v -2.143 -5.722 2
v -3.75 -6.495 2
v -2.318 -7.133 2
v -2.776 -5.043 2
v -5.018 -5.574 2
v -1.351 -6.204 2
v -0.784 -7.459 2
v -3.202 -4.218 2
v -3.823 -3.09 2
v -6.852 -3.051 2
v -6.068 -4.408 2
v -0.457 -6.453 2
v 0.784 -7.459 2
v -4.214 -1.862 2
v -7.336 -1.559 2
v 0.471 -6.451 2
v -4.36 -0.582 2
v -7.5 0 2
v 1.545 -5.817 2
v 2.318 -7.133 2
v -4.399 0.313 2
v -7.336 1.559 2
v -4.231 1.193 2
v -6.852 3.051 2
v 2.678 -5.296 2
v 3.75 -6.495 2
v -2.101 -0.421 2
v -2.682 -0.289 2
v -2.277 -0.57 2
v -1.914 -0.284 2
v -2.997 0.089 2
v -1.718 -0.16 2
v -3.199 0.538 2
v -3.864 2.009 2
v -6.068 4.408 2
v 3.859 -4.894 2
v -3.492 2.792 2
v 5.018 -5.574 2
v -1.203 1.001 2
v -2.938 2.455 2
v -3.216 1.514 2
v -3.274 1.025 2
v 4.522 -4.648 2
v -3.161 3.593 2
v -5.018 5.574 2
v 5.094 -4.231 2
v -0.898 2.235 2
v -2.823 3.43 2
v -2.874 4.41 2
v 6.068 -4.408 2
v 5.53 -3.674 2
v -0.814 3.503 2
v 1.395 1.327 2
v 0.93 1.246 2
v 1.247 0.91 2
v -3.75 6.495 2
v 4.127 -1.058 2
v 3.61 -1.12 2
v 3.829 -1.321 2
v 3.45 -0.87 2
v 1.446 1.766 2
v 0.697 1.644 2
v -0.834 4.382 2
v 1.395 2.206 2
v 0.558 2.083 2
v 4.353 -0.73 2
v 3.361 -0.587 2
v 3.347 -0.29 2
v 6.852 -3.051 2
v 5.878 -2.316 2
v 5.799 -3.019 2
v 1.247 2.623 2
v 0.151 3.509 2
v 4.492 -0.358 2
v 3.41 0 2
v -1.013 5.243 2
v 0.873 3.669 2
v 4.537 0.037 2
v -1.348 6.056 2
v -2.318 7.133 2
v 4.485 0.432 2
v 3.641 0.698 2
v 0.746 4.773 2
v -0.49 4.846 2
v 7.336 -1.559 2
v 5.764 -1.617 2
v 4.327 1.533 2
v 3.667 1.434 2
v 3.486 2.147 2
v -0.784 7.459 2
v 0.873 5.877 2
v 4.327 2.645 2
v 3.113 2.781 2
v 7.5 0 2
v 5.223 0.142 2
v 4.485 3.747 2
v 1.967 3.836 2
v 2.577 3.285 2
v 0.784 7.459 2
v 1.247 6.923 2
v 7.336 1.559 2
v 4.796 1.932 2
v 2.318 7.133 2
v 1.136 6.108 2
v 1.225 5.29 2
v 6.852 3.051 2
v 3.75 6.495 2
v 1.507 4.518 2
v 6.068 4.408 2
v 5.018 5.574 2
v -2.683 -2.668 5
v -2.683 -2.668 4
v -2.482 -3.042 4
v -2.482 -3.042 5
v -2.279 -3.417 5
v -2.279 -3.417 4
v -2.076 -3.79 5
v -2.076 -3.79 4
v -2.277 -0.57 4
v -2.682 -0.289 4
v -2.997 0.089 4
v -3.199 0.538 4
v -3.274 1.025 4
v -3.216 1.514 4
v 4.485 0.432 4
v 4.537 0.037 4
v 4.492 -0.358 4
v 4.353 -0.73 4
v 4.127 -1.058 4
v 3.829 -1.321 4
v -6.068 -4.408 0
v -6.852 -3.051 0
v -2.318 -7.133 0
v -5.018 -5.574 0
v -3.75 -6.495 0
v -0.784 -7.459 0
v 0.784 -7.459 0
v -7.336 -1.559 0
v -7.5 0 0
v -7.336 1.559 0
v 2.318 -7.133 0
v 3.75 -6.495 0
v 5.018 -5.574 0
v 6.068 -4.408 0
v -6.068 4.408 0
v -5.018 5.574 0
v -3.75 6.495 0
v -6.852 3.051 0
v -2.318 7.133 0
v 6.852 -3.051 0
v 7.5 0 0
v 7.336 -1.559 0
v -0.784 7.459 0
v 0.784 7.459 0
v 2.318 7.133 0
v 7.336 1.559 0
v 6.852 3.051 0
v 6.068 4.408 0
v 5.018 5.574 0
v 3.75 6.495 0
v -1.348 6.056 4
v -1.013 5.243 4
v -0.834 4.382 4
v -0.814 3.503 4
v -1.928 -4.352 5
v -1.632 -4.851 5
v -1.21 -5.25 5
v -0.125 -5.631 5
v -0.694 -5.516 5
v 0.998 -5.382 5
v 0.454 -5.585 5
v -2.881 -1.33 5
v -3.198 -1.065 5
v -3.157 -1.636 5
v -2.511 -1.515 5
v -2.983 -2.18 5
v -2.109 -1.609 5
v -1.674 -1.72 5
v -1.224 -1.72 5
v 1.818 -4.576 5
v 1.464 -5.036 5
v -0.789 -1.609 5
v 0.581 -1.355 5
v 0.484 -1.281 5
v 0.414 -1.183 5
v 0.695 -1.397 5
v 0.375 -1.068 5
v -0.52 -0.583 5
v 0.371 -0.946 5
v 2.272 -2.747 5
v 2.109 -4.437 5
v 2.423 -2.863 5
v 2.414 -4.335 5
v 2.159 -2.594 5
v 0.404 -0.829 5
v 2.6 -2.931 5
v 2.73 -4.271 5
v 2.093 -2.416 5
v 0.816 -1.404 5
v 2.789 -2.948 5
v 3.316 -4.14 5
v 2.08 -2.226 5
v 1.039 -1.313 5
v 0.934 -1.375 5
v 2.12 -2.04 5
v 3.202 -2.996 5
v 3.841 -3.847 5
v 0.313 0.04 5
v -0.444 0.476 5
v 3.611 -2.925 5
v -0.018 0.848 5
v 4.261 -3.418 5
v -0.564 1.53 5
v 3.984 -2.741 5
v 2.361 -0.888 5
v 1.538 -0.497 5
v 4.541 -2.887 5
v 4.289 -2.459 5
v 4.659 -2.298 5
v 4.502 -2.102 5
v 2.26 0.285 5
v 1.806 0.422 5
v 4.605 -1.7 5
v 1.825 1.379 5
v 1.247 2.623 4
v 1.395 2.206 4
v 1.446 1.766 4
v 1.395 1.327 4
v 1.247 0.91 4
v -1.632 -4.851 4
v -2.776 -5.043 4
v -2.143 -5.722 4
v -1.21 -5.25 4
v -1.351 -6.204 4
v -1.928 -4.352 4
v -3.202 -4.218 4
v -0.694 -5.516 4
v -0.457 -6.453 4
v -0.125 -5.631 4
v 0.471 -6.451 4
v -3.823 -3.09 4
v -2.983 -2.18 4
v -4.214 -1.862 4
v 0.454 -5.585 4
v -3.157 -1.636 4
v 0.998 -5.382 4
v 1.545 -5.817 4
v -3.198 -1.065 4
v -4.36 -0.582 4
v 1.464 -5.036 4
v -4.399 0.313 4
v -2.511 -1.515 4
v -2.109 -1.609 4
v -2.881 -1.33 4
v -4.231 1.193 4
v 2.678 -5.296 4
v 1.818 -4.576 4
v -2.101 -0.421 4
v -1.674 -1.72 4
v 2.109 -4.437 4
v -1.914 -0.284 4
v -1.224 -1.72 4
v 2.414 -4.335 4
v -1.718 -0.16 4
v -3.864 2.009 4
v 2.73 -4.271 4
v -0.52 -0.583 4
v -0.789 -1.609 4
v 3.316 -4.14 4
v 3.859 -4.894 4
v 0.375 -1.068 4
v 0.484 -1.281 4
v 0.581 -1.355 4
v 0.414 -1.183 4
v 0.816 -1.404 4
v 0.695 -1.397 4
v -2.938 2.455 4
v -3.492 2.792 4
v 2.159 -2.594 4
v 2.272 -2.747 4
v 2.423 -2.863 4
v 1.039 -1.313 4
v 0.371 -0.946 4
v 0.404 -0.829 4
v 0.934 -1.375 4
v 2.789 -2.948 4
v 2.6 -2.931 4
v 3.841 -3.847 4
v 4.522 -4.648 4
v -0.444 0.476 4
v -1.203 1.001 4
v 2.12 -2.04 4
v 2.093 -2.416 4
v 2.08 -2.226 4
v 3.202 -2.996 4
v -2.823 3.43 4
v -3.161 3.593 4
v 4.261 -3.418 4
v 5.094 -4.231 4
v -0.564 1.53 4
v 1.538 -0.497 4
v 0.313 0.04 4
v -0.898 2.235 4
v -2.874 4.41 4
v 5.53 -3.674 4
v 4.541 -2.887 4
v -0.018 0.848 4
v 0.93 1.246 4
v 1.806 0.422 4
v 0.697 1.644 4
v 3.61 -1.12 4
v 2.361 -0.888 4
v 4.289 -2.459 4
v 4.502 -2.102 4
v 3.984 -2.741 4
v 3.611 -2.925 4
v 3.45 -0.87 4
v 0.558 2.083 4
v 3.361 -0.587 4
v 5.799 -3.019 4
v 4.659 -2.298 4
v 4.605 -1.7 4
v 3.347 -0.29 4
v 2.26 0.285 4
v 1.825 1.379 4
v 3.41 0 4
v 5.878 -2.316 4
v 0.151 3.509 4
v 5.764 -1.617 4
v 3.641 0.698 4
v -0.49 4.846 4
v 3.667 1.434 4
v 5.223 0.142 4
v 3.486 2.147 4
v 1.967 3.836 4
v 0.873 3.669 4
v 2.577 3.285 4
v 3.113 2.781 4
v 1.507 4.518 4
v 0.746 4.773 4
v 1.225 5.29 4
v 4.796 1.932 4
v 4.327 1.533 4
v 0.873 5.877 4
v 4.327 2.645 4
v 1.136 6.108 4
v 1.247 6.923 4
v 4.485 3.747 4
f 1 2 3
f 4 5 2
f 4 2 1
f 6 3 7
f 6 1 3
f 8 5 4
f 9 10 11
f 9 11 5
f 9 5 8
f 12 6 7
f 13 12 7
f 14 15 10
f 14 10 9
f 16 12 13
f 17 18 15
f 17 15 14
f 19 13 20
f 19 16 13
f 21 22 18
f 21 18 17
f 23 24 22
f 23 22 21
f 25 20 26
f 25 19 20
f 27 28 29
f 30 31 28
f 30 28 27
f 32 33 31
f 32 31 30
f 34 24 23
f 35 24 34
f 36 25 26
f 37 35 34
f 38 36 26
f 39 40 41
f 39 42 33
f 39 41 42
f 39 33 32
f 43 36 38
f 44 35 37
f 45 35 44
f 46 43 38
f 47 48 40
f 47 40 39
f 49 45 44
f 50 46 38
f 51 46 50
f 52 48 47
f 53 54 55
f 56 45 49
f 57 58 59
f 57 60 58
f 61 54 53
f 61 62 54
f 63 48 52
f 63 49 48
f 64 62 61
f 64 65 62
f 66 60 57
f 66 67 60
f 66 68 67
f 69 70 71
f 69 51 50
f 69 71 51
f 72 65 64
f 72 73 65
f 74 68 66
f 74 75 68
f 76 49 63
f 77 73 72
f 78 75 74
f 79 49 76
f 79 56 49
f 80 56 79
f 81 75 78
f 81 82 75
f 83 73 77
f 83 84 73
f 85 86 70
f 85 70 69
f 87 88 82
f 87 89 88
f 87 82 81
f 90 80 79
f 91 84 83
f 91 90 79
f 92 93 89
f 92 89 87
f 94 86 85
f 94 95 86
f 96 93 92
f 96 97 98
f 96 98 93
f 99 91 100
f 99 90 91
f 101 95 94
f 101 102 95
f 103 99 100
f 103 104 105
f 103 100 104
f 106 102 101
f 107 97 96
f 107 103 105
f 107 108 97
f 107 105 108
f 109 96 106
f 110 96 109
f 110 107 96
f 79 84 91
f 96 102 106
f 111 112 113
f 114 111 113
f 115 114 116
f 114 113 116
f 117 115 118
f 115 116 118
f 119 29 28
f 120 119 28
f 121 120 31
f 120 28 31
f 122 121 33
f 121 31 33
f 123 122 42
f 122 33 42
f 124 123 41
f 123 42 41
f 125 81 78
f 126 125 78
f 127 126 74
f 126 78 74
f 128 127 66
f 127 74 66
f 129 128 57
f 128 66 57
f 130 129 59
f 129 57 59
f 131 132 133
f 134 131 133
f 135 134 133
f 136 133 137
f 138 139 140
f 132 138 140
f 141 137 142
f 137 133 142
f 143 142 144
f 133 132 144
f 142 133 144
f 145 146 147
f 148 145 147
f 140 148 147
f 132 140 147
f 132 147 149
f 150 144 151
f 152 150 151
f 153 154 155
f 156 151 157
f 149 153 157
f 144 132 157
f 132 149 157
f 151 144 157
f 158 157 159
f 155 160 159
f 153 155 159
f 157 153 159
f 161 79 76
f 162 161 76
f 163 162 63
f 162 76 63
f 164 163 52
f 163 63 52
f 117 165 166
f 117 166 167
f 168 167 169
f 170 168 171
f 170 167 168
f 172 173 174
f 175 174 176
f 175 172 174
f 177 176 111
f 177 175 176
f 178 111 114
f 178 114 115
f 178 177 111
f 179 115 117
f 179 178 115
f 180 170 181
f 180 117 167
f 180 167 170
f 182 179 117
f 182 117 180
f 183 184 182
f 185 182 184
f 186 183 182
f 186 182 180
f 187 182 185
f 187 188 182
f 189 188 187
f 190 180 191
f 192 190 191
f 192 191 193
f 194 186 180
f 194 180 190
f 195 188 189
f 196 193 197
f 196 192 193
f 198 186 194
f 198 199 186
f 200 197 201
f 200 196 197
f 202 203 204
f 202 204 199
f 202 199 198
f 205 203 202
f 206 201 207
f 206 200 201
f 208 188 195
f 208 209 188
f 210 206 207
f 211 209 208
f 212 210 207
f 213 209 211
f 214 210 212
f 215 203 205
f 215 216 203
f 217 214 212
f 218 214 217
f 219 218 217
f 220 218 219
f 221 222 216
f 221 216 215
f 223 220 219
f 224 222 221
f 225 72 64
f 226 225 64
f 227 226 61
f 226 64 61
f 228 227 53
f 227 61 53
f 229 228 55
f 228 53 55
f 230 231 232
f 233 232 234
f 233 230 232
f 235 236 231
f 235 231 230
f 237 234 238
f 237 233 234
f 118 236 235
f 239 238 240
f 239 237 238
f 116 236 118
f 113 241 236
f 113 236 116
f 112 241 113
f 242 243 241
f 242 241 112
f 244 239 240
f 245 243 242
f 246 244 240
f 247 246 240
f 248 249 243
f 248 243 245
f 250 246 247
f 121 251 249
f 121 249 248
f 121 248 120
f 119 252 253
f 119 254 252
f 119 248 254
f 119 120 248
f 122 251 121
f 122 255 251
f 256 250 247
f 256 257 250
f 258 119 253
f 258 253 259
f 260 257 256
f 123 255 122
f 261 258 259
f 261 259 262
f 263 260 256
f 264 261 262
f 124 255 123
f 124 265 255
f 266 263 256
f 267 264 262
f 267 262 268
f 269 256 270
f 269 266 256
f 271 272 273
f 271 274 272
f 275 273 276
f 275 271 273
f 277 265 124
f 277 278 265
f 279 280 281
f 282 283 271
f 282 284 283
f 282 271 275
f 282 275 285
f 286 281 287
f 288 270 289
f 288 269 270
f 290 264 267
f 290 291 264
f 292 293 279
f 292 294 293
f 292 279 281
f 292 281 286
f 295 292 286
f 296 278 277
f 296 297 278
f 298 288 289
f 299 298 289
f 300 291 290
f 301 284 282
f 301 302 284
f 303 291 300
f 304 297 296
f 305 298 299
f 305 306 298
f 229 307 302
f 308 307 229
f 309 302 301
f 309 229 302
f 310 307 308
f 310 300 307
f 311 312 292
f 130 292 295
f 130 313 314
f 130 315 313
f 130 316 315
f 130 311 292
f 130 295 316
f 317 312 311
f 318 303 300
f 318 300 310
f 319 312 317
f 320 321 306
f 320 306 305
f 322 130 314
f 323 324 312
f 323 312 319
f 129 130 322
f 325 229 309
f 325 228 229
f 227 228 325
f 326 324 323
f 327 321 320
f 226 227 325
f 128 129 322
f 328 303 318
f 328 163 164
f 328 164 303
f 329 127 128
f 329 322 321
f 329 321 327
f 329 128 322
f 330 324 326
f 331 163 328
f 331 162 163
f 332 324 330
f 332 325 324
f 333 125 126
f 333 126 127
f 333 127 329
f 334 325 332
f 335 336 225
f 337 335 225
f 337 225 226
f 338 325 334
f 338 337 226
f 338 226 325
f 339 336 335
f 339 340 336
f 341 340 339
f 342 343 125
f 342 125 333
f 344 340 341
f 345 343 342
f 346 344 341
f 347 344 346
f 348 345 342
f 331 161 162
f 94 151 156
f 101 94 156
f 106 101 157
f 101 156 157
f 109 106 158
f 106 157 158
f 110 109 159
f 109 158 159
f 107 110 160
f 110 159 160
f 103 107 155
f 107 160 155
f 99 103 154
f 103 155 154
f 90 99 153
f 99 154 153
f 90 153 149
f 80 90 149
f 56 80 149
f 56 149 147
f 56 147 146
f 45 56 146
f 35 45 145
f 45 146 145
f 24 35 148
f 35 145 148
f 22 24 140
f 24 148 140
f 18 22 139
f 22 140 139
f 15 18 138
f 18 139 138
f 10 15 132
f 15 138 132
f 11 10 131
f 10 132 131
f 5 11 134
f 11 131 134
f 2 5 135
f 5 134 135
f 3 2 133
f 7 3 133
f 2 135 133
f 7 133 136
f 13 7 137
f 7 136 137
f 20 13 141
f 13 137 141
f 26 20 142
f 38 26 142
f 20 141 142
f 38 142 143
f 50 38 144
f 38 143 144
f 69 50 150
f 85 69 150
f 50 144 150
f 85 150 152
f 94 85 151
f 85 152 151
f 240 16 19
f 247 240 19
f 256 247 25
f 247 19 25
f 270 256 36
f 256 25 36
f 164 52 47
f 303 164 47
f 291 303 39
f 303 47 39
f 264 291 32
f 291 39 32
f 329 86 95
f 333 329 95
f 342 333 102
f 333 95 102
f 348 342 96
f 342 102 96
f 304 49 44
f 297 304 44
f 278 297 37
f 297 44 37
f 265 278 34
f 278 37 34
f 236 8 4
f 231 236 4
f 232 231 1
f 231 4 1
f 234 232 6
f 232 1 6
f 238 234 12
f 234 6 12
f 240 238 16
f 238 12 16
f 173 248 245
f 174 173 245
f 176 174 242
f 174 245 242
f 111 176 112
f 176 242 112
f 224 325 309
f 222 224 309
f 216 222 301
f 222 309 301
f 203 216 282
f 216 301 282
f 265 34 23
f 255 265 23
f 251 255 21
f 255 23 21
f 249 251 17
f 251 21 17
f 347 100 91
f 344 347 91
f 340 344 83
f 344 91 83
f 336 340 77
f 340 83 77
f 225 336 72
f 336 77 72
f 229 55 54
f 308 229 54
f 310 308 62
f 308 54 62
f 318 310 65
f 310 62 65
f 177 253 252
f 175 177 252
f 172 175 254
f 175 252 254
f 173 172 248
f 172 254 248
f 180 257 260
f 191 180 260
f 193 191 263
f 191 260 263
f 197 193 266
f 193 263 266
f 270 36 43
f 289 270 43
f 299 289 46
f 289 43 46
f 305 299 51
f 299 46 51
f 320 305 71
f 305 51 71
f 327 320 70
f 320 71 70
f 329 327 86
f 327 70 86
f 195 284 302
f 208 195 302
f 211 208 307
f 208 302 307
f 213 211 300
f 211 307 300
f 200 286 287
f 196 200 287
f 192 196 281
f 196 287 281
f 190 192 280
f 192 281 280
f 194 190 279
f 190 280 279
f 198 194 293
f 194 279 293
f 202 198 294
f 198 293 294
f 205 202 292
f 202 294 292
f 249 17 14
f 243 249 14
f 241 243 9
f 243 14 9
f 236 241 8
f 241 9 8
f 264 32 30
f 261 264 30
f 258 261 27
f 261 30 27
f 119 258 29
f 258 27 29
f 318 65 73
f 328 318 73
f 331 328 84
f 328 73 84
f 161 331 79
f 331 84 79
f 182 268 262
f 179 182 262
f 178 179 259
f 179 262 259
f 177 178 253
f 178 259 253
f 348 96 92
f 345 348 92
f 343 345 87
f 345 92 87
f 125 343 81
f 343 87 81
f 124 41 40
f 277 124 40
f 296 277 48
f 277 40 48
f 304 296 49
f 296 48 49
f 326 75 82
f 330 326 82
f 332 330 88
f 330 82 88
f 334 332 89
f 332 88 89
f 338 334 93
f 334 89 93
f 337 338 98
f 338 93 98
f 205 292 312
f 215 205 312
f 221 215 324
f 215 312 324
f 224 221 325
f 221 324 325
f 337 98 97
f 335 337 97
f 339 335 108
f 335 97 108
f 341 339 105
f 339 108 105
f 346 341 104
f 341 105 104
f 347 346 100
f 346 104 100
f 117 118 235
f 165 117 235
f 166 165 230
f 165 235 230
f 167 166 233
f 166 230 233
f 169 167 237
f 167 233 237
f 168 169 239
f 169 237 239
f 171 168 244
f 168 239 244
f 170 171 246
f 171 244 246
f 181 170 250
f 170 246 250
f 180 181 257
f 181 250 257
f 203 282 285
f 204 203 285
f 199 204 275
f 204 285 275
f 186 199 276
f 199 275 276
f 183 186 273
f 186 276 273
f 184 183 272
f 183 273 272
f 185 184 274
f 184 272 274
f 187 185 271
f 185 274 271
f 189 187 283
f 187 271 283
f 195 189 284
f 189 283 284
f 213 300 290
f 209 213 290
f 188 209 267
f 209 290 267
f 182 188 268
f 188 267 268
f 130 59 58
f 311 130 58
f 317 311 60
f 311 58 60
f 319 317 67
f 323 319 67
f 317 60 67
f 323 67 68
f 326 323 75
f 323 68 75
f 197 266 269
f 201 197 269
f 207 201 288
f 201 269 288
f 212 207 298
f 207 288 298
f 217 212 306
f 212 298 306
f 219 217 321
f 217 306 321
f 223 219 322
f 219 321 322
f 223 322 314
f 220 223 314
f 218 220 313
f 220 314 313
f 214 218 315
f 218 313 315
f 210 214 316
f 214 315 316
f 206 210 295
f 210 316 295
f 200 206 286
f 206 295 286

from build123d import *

# Parameters (mm, degrees)
F0_R     = 7.5
F1_DEPTH = 2
F3_DEPTH = 2
F5_DEPTH = 1


with BuildPart() as f1:
    # F0 (on Top) → F1 (new body)
    with BuildSketch(Plane.XY):
        Circle(F0_R)
    extrude(amount=F1_DEPTH)

    # F2 (on face) → F3 (join)
    with BuildSketch(Plane.XY.offset(2)):
        with BuildLine():
            ThreePointArc((-4.359569, -0.5816), (-4.048866, -2.485422), (-3.201723, -4.21846))
            ThreePointArc((-3.201723, -4.21846), (-1.763517, -5.989849), (0.471135, -6.450916))
            ThreePointArc((0.471135, -6.450916), (2.104993, -5.542203), (3.85862, -4.894092))
            ThreePointArc((3.85862, -4.894092), (5.530357, -3.673758), (5.763789, -1.6172))
            ThreePointArc((5.763789, -1.6172), (4.99478, 1.033842), (4.484988, 3.746685))
            ThreePointArc((4.484988, 3.746685), (4.307559, 2.089188), (4.484988, 0.43169))
            ThreePointArc((4.484988, 0.43169), (4.433756, -0.548224), (3.829129, -1.321065))
            ThreePointArc((3.829129, -1.321065), (3.396288, -0.731371), (3.409992, 0))
            ThreePointArc((3.409992, 0), (3.601771, 1.796582), (2.577243, 3.284811))
            ThreePointArc((2.577243, 3.284811), (1.342352, 4.895456), (1.246507, 6.922756))
            ThreePointArc((1.246507, 6.922756), (0.746139, 4.772952), (1.246507, 2.623147))
            ThreePointArc((1.246507, 2.623147), (1.445906, 1.76644), (1.246507, 0.909734))
            ThreePointArc((1.246507, 0.909734), (0.802459, 1.438025), (0.558072, 2.083429))
            ThreePointArc((0.558072, 2.083429), (-0.141358, 4.191438), (-1.347645, 6.056319))
            ThreePointArc((-1.347645, 6.056319), (-0.903638, 4.8169), (-0.814198, 3.503393))
            ThreePointArc((-0.814198, 3.503393), (-1.023492, 1.611686), (-1.718377, -0.160176))
            ThreePointArc((-1.718377, -0.160176), (-2.008384, -0.350929), (-2.2774, -0.570297))
            ThreePointArc((-2.2774, -0.570297), (-3.112946, 0.306997), (-3.216468, 1.514086))
            ThreePointArc((-3.216468, 1.514086), (-2.859593, 2.940059), (-2.873537, 4.409944))
            ThreePointArc((-2.873537, 4.409944), (-3.321426, 3.190102), (-3.864225, 2.00943))
            ThreePointArc((-3.864225, 2.00943), (-4.340752, 0.757667), (-4.359569, -0.5816))
        make_face()
    extrude(amount=F3_DEPTH)

    # F4 (on face) → F5 (join)
    with BuildSketch(Plane.XY.offset(4)):
        with BuildLine():
            ThreePointArc((-2.683389, -2.667802), (-2.380518, -3.229598), (-2.075762, -3.790374))
            ThreePointArc((-2.075762, -3.790374), (-0.413473, -5.59377), (1.818095, -4.576151))
            ThreePointArc((1.818095, -4.576151), (2.259919, -4.381156), (2.73005, -4.270664))
            ThreePointArc((2.73005, -4.270664), (4.260916, -3.418142), (4.605096, -1.700036))
            ThreePointArc((4.605096, -1.700036), (3.983593, -2.740688), (2.789322, -2.947901))
            ThreePointArc((2.789322, -2.947901), (2.209801, -2.674705), (2.119534, -2.040409))
            ThreePointArc((2.119534, -2.040409), (2.35368, -0.297977), (1.824975, 1.378736))
            ThreePointArc((1.824975, 1.378736), (1.702683, -0.046192), (1.038666, -1.312863))
            ThreePointArc((1.038666, -1.312863), (0.529939, -1.321844), (0.403569, -0.82898))
            ThreePointArc((0.403569, -0.82898), (0.176498, 0.455843), (-0.564196, 1.529949))
            ThreePointArc((-0.564196, 1.529949), (-0.457664, -0.055376), (-0.789172, -1.609308))
            ThreePointArc((-0.789172, -1.609308), (-1.448975, -1.733967), (-2.108778, -1.609308))
            ThreePointArc((-2.108778, -1.609308), (-2.701327, -1.433486), (-3.197515, -1.06494))
            ThreePointArc((-3.197515, -1.06494), (-3.086289, -1.913149), (-2.683389, -2.667802))
        make_face()
    extrude(amount=F5_DEPTH)


solid = f1.part
